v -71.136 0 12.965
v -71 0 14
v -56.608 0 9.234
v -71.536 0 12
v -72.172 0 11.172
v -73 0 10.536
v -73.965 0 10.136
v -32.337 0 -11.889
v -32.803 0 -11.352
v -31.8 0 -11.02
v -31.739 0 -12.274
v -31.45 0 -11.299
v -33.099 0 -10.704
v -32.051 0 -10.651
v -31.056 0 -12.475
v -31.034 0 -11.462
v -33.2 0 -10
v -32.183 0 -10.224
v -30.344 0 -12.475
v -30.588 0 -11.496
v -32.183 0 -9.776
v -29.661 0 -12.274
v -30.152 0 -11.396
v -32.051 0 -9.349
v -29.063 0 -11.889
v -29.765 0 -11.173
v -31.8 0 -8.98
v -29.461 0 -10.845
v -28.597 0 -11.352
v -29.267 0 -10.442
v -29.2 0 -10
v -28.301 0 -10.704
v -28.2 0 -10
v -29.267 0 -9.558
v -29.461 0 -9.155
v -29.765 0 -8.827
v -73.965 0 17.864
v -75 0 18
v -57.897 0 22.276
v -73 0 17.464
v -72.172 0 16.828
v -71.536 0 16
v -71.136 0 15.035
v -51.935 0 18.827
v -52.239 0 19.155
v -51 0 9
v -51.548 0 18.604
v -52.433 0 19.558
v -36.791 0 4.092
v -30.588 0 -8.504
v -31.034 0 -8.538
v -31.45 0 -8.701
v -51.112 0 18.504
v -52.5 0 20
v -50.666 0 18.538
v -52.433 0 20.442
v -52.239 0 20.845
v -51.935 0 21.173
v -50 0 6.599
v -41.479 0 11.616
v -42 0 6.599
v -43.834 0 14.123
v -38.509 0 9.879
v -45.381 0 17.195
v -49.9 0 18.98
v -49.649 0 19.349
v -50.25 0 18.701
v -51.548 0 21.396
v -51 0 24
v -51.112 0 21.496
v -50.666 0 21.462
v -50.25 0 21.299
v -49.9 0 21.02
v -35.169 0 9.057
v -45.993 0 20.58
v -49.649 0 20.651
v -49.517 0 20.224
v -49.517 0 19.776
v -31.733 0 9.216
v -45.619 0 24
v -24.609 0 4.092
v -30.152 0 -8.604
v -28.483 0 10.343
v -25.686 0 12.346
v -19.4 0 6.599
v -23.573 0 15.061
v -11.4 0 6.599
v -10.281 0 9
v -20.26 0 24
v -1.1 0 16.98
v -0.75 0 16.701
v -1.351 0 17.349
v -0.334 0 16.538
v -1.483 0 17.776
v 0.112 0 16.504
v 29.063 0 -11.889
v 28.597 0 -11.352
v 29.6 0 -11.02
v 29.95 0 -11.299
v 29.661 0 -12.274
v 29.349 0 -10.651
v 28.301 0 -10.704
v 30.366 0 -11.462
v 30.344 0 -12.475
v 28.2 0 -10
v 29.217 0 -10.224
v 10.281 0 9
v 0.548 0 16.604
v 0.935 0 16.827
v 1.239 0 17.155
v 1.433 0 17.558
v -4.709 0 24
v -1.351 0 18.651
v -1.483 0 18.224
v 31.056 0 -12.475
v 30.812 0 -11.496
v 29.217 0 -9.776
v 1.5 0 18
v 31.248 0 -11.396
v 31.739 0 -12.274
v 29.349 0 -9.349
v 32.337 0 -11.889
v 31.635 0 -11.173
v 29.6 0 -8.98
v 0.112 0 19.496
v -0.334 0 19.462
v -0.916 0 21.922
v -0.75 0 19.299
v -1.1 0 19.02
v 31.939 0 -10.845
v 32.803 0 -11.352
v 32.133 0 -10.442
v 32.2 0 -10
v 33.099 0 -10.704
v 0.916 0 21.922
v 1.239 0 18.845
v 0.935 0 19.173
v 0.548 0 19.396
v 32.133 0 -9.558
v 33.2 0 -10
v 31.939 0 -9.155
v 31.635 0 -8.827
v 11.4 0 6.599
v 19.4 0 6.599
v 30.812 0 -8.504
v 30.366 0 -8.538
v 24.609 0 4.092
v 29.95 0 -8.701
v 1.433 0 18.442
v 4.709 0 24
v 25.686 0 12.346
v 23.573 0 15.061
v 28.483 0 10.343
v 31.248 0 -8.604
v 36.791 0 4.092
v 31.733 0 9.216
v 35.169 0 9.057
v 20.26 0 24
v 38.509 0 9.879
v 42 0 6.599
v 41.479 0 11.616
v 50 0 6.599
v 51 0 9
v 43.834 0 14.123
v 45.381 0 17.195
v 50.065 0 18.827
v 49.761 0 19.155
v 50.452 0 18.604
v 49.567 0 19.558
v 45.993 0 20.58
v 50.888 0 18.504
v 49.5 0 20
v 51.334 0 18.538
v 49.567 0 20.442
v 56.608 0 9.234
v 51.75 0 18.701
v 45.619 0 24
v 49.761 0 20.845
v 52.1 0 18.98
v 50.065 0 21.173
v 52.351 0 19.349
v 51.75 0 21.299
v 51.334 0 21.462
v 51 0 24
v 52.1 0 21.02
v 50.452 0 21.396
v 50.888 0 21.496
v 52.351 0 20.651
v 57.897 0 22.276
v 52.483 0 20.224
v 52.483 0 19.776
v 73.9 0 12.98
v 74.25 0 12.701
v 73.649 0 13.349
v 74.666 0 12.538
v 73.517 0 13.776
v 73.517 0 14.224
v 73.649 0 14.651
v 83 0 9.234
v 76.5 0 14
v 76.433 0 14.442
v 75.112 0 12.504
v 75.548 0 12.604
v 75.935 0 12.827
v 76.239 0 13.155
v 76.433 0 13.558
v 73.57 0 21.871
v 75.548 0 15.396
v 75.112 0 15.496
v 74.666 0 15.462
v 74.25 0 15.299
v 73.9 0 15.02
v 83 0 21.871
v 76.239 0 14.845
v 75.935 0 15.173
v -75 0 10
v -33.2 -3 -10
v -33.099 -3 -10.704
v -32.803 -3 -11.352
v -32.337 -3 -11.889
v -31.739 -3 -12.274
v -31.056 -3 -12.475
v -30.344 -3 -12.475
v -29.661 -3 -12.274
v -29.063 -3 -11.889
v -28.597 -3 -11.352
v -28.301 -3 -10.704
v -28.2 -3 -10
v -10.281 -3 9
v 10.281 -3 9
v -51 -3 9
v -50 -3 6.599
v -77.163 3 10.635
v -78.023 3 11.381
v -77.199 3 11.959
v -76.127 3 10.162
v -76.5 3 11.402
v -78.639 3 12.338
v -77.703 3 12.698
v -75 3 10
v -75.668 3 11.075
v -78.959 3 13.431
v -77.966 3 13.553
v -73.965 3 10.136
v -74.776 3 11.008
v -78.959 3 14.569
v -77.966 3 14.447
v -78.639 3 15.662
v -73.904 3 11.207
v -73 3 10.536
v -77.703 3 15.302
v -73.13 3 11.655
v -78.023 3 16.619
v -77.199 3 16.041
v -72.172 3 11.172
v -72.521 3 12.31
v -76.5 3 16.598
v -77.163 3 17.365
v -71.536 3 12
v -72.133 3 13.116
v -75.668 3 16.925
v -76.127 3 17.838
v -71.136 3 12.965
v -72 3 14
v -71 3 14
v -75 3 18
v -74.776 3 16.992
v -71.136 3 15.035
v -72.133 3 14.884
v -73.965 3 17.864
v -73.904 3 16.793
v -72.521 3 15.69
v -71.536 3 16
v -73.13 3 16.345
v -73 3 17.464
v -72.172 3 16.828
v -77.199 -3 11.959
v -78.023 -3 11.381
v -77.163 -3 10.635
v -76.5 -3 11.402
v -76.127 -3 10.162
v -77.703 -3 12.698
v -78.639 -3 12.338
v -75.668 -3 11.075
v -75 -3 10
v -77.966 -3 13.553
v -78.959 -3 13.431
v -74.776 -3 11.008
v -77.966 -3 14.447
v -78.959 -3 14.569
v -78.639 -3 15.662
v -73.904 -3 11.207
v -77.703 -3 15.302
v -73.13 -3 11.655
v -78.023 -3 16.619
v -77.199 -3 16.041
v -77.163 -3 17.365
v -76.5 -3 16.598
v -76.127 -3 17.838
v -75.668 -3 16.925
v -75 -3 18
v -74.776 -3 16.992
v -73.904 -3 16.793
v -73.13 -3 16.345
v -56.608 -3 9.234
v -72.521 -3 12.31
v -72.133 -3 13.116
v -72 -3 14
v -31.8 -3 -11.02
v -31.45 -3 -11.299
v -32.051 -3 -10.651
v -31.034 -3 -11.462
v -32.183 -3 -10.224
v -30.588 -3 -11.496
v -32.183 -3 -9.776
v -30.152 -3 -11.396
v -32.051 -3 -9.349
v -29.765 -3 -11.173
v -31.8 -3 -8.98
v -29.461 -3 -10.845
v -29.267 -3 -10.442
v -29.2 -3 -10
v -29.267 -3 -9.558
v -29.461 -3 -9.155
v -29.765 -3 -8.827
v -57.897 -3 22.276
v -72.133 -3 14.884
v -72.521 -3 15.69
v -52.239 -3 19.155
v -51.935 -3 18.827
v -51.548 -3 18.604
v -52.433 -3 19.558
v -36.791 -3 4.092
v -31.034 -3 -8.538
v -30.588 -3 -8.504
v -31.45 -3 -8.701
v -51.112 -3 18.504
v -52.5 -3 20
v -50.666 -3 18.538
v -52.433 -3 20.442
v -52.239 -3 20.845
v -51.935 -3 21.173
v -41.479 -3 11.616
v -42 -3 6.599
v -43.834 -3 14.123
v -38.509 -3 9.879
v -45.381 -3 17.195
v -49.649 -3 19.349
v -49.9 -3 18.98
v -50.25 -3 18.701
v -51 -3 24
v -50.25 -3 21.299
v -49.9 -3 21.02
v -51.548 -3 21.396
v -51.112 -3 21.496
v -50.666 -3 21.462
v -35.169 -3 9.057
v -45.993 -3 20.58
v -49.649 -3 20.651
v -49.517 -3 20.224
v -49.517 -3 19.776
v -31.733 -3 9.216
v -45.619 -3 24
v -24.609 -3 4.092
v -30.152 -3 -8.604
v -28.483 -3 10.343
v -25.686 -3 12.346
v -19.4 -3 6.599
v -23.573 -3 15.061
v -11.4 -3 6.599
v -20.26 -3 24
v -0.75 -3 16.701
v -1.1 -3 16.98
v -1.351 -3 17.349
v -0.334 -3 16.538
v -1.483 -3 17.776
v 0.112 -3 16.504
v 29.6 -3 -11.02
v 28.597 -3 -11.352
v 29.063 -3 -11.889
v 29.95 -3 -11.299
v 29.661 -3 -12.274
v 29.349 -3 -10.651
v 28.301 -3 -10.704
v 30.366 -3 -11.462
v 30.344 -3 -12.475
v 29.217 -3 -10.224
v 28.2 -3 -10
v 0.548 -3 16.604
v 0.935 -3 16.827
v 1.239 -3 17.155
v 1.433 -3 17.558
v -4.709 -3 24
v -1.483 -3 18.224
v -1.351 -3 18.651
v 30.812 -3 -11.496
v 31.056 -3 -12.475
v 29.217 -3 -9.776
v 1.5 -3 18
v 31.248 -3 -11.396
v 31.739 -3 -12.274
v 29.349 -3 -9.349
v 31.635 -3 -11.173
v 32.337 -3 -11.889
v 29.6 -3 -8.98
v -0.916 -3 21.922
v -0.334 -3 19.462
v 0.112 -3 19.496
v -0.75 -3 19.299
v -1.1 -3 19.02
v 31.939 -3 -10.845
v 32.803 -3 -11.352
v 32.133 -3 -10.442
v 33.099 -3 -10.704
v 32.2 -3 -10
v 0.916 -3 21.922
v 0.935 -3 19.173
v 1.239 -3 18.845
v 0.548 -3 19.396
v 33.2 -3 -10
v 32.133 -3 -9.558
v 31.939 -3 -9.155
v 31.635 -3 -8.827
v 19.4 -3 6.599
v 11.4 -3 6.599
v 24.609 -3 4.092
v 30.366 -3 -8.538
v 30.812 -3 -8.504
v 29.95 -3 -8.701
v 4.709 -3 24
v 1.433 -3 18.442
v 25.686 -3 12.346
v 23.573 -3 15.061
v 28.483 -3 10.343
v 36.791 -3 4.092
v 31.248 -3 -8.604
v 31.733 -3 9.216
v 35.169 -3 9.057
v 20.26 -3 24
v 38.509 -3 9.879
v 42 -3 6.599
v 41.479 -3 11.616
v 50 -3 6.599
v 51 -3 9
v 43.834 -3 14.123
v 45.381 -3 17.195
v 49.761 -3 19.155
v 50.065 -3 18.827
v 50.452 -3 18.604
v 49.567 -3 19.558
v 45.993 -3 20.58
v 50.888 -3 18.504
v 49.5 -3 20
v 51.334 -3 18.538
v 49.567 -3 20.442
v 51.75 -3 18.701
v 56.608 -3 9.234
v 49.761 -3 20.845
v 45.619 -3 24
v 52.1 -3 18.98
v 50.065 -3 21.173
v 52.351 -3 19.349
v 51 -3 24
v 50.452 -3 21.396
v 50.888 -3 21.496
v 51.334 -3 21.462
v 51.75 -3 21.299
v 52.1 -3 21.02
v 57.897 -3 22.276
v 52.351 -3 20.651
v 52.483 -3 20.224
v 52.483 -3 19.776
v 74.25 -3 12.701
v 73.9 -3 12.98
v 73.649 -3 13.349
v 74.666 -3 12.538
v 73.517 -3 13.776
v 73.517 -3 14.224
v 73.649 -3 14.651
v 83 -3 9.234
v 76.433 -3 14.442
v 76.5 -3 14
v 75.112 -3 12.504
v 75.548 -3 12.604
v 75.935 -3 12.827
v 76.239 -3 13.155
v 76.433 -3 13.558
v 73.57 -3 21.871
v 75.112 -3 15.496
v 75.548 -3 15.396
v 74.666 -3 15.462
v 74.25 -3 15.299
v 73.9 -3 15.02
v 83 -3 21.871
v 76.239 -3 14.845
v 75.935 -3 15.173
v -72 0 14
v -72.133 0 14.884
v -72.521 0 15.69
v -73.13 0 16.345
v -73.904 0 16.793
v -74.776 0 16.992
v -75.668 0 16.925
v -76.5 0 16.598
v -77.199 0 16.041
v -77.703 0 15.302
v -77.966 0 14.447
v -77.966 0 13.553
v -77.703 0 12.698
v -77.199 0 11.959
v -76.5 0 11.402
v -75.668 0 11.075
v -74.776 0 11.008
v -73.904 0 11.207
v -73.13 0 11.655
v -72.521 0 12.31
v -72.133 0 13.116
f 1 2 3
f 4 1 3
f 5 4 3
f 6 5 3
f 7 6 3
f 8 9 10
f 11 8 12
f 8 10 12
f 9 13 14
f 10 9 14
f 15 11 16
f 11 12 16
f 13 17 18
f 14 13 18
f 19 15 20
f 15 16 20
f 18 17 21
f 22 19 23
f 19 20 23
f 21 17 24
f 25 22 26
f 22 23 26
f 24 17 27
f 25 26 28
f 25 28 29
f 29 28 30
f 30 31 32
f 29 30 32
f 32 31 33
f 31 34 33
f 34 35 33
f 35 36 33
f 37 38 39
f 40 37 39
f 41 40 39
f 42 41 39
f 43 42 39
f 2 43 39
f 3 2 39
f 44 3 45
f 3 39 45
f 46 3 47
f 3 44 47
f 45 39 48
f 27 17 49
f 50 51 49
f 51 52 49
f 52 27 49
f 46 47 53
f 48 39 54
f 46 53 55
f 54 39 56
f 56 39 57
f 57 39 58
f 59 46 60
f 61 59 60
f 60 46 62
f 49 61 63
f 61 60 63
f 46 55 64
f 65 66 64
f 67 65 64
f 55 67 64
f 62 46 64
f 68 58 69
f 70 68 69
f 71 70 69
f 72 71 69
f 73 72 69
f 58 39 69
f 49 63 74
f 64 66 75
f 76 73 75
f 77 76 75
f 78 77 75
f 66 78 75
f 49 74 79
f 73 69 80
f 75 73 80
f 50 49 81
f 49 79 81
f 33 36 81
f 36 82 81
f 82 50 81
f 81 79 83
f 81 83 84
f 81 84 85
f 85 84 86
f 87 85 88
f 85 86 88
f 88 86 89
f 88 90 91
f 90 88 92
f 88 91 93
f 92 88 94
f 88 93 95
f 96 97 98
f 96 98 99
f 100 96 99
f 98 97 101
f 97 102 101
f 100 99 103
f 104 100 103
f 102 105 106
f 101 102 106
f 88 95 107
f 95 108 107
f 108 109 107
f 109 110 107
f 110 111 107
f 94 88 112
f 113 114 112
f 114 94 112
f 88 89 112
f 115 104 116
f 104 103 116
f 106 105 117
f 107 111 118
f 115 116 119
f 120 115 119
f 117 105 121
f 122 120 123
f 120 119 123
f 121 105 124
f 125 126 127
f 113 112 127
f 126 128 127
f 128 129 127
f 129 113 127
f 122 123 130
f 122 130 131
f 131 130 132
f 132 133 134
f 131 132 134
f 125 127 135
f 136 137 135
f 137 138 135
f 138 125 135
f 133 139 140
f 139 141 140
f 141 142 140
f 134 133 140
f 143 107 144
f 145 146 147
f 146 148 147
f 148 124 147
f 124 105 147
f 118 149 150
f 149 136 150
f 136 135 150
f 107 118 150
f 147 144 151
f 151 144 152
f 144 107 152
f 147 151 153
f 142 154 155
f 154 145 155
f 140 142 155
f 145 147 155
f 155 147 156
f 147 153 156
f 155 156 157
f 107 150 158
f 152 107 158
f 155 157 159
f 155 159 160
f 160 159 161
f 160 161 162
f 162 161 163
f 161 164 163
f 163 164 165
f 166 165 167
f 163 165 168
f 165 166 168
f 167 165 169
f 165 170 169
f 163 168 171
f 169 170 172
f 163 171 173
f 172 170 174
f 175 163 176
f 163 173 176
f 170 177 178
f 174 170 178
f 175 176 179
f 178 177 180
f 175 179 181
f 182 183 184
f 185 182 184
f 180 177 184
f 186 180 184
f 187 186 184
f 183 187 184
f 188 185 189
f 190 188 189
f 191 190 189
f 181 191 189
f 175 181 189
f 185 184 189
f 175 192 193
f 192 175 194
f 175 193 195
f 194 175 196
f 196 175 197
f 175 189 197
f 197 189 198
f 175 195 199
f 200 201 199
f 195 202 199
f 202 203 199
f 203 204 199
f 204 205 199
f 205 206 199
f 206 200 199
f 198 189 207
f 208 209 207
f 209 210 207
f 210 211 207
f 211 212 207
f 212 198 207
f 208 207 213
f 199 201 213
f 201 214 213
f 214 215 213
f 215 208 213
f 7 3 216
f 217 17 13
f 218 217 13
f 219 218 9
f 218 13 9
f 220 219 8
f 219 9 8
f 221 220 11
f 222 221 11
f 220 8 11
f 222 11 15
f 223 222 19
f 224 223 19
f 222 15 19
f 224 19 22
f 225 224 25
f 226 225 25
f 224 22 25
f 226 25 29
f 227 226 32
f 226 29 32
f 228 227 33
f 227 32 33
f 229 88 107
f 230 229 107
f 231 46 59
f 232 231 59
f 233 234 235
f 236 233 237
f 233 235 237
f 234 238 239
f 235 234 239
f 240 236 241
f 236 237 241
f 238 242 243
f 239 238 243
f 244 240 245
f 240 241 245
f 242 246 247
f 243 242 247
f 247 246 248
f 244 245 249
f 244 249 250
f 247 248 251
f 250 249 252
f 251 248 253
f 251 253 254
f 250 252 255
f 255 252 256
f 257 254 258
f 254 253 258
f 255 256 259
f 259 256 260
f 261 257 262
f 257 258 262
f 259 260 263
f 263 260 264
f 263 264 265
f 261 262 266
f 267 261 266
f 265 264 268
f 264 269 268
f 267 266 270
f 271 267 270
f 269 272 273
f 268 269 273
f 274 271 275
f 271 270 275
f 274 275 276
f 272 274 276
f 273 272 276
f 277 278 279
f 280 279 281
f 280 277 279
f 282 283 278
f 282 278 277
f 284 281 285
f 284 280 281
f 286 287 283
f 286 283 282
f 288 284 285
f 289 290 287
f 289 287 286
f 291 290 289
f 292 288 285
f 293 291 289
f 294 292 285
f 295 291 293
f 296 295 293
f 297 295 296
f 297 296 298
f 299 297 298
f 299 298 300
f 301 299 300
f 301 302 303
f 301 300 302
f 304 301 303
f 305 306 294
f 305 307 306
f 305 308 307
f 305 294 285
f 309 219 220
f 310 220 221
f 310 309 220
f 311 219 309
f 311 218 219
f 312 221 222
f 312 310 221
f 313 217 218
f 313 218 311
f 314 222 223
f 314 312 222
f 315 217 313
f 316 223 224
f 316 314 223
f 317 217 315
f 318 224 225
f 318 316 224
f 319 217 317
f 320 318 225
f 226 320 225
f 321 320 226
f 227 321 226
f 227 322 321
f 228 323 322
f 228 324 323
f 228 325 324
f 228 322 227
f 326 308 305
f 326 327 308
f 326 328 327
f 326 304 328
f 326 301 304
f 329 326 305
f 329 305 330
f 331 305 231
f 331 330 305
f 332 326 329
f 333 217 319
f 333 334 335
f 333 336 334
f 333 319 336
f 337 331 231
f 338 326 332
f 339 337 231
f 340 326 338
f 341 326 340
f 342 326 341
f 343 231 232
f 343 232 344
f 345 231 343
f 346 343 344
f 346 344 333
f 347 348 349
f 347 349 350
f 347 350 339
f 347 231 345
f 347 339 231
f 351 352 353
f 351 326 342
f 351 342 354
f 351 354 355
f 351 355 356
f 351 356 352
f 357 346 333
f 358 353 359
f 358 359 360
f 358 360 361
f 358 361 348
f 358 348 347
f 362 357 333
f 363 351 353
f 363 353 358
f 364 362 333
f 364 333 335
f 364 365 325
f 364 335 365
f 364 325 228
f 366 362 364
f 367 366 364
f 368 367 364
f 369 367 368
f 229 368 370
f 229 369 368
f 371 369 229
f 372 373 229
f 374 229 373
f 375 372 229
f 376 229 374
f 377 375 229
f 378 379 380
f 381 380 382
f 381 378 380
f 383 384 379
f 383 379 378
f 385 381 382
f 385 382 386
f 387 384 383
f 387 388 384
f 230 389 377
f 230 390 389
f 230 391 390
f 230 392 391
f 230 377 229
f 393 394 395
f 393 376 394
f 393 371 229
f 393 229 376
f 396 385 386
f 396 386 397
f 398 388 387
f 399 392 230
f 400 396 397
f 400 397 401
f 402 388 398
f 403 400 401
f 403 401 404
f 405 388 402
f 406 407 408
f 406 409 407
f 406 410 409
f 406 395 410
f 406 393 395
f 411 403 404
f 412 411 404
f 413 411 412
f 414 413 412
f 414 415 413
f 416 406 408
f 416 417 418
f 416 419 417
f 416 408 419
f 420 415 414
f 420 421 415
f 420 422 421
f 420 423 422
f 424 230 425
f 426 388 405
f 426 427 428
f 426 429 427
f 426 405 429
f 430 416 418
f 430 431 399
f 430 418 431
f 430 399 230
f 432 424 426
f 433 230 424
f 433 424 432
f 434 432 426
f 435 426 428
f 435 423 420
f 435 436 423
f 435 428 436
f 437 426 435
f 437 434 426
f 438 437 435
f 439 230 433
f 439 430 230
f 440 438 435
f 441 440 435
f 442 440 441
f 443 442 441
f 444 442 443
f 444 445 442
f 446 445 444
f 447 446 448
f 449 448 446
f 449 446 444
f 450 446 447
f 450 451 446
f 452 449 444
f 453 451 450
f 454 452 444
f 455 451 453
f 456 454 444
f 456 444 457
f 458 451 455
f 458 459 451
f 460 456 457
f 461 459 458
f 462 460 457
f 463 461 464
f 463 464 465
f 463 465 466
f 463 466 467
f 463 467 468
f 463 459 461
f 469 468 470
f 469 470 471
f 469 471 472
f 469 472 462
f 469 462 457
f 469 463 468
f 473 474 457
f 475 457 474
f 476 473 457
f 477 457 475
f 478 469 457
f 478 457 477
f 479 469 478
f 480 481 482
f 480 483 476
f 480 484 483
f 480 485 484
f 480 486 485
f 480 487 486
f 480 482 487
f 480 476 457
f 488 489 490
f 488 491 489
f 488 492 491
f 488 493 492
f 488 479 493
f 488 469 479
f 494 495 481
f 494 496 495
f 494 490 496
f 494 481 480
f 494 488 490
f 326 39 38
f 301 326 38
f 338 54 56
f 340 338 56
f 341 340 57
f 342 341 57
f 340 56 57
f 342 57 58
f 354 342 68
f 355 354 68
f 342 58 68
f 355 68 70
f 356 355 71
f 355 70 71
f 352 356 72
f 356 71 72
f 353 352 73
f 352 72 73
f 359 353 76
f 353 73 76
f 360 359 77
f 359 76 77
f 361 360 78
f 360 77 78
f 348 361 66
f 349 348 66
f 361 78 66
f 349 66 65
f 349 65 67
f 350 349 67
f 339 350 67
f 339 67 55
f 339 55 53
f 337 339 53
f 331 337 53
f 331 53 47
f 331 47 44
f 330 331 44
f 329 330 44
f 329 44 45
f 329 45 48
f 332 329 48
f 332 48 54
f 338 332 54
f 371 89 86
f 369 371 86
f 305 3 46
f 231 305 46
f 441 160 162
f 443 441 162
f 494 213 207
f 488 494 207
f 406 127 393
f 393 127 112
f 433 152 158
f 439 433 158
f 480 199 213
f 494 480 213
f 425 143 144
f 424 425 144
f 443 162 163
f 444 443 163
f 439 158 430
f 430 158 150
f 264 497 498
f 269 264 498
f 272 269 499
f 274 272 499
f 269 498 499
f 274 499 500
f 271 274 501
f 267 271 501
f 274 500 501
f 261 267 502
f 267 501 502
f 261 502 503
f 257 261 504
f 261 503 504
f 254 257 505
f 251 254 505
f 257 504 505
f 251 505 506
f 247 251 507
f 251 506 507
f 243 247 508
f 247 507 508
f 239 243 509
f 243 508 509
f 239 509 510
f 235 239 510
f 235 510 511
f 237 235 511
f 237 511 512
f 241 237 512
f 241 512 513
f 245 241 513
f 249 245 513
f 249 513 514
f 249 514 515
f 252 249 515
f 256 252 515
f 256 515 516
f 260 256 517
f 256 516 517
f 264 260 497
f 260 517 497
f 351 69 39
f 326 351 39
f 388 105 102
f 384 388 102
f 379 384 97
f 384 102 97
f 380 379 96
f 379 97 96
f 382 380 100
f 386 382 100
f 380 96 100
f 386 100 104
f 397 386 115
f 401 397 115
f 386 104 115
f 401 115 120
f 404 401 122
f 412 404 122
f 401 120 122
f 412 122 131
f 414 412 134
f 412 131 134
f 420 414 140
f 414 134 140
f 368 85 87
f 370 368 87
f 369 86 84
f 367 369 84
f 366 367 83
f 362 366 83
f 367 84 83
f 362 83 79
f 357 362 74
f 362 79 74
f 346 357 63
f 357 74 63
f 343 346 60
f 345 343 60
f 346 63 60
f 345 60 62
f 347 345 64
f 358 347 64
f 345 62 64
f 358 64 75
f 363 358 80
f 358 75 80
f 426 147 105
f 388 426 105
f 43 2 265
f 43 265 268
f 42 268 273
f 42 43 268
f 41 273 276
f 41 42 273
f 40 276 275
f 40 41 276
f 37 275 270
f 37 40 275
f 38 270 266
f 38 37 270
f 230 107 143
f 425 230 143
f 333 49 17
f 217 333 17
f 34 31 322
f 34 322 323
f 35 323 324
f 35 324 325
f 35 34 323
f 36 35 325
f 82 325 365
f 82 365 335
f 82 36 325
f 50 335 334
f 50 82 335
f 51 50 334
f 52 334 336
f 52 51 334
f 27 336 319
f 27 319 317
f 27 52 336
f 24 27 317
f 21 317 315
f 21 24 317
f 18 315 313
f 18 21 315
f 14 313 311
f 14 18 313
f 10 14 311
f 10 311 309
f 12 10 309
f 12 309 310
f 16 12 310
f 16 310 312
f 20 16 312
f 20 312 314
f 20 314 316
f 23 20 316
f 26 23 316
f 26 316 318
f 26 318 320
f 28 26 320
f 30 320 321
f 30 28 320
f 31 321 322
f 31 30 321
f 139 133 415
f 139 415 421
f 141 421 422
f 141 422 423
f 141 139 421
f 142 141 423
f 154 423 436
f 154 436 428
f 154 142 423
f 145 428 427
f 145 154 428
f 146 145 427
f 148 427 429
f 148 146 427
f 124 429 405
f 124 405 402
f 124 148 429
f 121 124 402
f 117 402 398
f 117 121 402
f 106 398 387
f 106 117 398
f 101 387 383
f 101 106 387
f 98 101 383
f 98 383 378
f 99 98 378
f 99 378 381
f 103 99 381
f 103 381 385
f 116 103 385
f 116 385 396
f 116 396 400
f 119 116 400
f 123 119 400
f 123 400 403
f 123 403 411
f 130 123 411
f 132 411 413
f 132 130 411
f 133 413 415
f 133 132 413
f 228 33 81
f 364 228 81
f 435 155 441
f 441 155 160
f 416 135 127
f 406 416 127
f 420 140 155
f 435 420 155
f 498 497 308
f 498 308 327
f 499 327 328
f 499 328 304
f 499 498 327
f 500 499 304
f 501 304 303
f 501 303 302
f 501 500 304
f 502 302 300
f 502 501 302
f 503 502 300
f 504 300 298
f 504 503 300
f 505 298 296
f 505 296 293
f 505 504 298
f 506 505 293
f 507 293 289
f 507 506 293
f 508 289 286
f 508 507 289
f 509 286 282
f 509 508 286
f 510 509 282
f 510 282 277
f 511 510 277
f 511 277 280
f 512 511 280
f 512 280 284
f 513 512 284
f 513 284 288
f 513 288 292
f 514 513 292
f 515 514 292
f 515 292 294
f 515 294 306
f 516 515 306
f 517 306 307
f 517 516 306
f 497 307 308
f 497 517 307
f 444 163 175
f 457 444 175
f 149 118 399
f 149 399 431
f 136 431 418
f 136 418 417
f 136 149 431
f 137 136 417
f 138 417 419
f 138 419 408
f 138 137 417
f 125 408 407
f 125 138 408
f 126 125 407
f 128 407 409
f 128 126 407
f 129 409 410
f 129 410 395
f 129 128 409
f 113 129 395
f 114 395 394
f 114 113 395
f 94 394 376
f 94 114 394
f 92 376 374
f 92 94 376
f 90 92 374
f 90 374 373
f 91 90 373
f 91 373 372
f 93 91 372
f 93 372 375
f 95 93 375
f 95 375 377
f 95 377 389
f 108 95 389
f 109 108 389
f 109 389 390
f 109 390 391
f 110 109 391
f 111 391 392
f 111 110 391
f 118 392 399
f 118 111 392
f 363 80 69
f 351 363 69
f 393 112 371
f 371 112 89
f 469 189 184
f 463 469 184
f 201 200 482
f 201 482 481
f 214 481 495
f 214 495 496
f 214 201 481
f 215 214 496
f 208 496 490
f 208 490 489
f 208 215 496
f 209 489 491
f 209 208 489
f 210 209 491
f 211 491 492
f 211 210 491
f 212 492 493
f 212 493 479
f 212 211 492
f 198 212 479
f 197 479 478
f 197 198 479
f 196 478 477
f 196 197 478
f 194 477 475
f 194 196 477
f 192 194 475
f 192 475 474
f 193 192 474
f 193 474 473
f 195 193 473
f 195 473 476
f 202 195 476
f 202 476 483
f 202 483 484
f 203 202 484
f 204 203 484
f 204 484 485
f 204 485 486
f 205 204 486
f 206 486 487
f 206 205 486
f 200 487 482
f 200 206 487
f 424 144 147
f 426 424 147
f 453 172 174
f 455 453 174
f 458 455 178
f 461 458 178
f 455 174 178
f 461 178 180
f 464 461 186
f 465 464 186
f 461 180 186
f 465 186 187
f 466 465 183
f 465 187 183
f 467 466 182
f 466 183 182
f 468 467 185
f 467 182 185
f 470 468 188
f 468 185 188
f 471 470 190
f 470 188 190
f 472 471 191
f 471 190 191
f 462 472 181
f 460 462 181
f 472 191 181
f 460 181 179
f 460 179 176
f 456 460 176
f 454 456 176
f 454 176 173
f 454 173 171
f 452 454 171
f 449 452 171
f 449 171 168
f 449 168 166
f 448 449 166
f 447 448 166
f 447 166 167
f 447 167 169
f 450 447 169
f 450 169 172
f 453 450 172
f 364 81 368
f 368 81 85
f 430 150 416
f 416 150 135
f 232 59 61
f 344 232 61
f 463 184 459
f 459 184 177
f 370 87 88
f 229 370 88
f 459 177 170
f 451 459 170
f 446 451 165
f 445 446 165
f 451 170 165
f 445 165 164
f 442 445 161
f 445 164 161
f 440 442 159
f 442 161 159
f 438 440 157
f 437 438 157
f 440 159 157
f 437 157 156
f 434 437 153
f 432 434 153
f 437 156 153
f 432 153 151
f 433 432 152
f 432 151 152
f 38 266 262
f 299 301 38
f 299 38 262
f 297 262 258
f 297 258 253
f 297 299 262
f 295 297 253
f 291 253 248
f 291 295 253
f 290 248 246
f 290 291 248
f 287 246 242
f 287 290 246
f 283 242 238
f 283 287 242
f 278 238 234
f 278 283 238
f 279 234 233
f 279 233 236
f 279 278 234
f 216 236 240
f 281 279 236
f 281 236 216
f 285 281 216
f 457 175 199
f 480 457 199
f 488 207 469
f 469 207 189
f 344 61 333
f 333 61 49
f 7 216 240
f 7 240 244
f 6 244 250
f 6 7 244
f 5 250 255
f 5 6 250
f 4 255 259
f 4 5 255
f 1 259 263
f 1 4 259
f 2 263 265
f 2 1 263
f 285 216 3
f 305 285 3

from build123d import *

# Parameters (mm, degrees)
F0_R     = 1.5
F1_DEPTH = 3
F0_R_2   = 3
F2_DEPTH = 3
F4_D     = 3


with BuildPart() as f1:
    # F0 (on Front) → F1 (new body)
    with BuildSketch(Plane.XZ):
        with BuildLine():
            Line((-57.8970168753, 22.2757457812), (-75, 18))
            ThreePointArc((-75, 18), (-72.1715728753, 16.8284271247), (-71, 14))
            ThreePointArc((-71, 14), (-72.1715728753, 11.1715728753), (-75, 10))
            Line((-75, 10), (-56.6075588533, 9.2336482856))
            ThreePointArc((-56.6075588533, 9.2336482856), (-56.0921877833, 15.8693948691), (-57.8970168753, 22.2757457812))
        make_face()
        with BuildLine():
            Line((-51, 24), (-57.8970168753, 22.2757457812))
            ThreePointArc((-57.8970168753, 22.2757457812), (-56.0921877833, 15.8693948691), (-56.6075588533, 9.2336482856))
            Line((-56.6075588533, 9.2336482856), (-51, 9))
            Line((-51, 9), (-50, 6.5993144652))
            Line((-50, 6.5993144652), (-42, 6.5993144652))
            Line((-42, 6.5993144652), (-36.7907804817, 4.091785901))
            ThreePointArc((-36.7907804817, 4.091785901), (-30.7, 5.3517437692), (-24.6092195183, 4.091785901))
            Line((-24.6092195183, 4.091785901), (-19.4, 6.5993144652))
            Line((-19.4, 6.5993144652), (-11.4, 6.5993144652))
            Line((-11.4, 6.5993144652), (-10.2805419503, 9))
            Line((-10.2805419503, 9), (10.2805419503, 9))
            Line((10.2805419503, 9), (11.4, 6.5993144652))
            Line((11.4, 6.5993144652), (19.4, 6.5993144652))
            Line((19.4, 6.5993144652), (24.6092195183, 4.091785901))
            ThreePointArc((24.6092195183, 4.091785901), (30.7, 5.3517437692), (36.7907804817, 4.091785901))
            Line((36.7907804817, 4.091785901), (42, 6.5993144652))
            Line((42, 6.5993144652), (50, 6.5993144652))
            Line((50, 6.5993144652), (51, 9))
            Line((51, 9), (56.6075588533, 9.2336482856))
            ThreePointArc((56.6075588533, 9.2336482856), (56.0921877833, 15.8693948691), (57.8970168753, 22.2757457812))
            Line((57.8970168753, 22.2757457812), (51, 24))
            Line((51, 24), (45.6189500386, 24))
            ThreePointArc((45.6189500386, 24), (38.5092844997, 9.8794625444), (23.5729752888, 15.0605424767))
            Line((23.5729752888, 15.0605424767), (0, 12.9805740689))
            Line((0, 12.9805740689), (-23.5729752888, 15.0605424767))
            ThreePointArc((-23.5729752888, 15.0605424767), (-38.5092844997, 9.8794625444), (-45.6189500386, 24))
            Line((-45.6189500386, 24), (-51, 24))
        make_face()
        Polygon((-20.2601172091, 24), (-23.5729752888, 15.0605424767), (0, 12.9805740689), (23.5729752888, 15.0605424767), (20.2601172091, 24), (4.7092107675, 24), (0.9159085684, 21.9222409377), (-0.9159085684, 21.9222409377), (-4.7092107675, 24), align=None)
        with Locations((0, 18)):
            Circle(F0_R, mode=Mode.SUBTRACT)
        with BuildLine():
            Line((73.569615724, 21.8710863814), (57.8970168753, 22.2757457812))
            ThreePointArc((57.8970168753, 22.2757457812), (56.0921877833, 15.8693948691), (56.6075588533, 9.2336482856))
            Line((56.6075588533, 9.2336482856), (83, 9.2336482856))
            Line((83, 9.2336482856), (83, 21.8710863814))
            Line((83, 21.8710863814), (73.569615724, 21.8710863814))
        make_face()
        with Locations((75, 14)):
            Circle(F0_R, mode=Mode.SUBTRACT)
        with BuildLine():
            ThreePointArc((36.7907804817, 4.091785901), (30.7, 5.3517437692), (24.6092195183, 4.091785901))
            Line((24.6092195183, 4.091785901), (28.2, -10))
            ThreePointArc((28.2, -10), (30.7, -12.5), (33.2, -10))
            Line((33.2, -10), (36.7907804817, 4.091785901))
        make_face()
        with Locations((30.7, -10)):
            Circle(F0_R, mode=Mode.SUBTRACT)
        with BuildLine():
            ThreePointArc((-24.6092195183, 4.091785901), (-30.7, 5.3517437692), (-36.7907804817, 4.091785901))
            Line((-36.7907804817, 4.091785901), (-33.2, -10))
            ThreePointArc((-33.2, -10), (-30.7, -12.5), (-28.2, -10))
            Line((-28.2, -10), (-24.6092195183, 4.091785901))
        make_face()
        with Locations((-30.7, -10)):
            Circle(F0_R, mode=Mode.SUBTRACT)
    extrude(amount=F1_DEPTH)

    # F0 (on Front) → F2 (join, symmetric)
    with BuildSketch(Plane.XZ):
        with BuildLine():
            ThreePointArc((-71, 14), (-72.1715728753, 16.8284271247), (-75, 18))
            ThreePointArc((-75, 18), (-79, 14), (-75, 10))
            ThreePointArc((-75, 10), (-72.1715728753, 11.1715728753), (-71, 14))
        make_face()
        with Locations((-75, 14)):
            Circle(F0_R_2, mode=Mode.SUBTRACT)
    extrude(amount=F2_DEPTH, both=True)

    # F4 (through all)
    with Locations(Plane.XZ.offset(3)):
        with Locations((-51, 20), (51, 20)):
            Hole(F4_D / 2)


solid = f1.part
